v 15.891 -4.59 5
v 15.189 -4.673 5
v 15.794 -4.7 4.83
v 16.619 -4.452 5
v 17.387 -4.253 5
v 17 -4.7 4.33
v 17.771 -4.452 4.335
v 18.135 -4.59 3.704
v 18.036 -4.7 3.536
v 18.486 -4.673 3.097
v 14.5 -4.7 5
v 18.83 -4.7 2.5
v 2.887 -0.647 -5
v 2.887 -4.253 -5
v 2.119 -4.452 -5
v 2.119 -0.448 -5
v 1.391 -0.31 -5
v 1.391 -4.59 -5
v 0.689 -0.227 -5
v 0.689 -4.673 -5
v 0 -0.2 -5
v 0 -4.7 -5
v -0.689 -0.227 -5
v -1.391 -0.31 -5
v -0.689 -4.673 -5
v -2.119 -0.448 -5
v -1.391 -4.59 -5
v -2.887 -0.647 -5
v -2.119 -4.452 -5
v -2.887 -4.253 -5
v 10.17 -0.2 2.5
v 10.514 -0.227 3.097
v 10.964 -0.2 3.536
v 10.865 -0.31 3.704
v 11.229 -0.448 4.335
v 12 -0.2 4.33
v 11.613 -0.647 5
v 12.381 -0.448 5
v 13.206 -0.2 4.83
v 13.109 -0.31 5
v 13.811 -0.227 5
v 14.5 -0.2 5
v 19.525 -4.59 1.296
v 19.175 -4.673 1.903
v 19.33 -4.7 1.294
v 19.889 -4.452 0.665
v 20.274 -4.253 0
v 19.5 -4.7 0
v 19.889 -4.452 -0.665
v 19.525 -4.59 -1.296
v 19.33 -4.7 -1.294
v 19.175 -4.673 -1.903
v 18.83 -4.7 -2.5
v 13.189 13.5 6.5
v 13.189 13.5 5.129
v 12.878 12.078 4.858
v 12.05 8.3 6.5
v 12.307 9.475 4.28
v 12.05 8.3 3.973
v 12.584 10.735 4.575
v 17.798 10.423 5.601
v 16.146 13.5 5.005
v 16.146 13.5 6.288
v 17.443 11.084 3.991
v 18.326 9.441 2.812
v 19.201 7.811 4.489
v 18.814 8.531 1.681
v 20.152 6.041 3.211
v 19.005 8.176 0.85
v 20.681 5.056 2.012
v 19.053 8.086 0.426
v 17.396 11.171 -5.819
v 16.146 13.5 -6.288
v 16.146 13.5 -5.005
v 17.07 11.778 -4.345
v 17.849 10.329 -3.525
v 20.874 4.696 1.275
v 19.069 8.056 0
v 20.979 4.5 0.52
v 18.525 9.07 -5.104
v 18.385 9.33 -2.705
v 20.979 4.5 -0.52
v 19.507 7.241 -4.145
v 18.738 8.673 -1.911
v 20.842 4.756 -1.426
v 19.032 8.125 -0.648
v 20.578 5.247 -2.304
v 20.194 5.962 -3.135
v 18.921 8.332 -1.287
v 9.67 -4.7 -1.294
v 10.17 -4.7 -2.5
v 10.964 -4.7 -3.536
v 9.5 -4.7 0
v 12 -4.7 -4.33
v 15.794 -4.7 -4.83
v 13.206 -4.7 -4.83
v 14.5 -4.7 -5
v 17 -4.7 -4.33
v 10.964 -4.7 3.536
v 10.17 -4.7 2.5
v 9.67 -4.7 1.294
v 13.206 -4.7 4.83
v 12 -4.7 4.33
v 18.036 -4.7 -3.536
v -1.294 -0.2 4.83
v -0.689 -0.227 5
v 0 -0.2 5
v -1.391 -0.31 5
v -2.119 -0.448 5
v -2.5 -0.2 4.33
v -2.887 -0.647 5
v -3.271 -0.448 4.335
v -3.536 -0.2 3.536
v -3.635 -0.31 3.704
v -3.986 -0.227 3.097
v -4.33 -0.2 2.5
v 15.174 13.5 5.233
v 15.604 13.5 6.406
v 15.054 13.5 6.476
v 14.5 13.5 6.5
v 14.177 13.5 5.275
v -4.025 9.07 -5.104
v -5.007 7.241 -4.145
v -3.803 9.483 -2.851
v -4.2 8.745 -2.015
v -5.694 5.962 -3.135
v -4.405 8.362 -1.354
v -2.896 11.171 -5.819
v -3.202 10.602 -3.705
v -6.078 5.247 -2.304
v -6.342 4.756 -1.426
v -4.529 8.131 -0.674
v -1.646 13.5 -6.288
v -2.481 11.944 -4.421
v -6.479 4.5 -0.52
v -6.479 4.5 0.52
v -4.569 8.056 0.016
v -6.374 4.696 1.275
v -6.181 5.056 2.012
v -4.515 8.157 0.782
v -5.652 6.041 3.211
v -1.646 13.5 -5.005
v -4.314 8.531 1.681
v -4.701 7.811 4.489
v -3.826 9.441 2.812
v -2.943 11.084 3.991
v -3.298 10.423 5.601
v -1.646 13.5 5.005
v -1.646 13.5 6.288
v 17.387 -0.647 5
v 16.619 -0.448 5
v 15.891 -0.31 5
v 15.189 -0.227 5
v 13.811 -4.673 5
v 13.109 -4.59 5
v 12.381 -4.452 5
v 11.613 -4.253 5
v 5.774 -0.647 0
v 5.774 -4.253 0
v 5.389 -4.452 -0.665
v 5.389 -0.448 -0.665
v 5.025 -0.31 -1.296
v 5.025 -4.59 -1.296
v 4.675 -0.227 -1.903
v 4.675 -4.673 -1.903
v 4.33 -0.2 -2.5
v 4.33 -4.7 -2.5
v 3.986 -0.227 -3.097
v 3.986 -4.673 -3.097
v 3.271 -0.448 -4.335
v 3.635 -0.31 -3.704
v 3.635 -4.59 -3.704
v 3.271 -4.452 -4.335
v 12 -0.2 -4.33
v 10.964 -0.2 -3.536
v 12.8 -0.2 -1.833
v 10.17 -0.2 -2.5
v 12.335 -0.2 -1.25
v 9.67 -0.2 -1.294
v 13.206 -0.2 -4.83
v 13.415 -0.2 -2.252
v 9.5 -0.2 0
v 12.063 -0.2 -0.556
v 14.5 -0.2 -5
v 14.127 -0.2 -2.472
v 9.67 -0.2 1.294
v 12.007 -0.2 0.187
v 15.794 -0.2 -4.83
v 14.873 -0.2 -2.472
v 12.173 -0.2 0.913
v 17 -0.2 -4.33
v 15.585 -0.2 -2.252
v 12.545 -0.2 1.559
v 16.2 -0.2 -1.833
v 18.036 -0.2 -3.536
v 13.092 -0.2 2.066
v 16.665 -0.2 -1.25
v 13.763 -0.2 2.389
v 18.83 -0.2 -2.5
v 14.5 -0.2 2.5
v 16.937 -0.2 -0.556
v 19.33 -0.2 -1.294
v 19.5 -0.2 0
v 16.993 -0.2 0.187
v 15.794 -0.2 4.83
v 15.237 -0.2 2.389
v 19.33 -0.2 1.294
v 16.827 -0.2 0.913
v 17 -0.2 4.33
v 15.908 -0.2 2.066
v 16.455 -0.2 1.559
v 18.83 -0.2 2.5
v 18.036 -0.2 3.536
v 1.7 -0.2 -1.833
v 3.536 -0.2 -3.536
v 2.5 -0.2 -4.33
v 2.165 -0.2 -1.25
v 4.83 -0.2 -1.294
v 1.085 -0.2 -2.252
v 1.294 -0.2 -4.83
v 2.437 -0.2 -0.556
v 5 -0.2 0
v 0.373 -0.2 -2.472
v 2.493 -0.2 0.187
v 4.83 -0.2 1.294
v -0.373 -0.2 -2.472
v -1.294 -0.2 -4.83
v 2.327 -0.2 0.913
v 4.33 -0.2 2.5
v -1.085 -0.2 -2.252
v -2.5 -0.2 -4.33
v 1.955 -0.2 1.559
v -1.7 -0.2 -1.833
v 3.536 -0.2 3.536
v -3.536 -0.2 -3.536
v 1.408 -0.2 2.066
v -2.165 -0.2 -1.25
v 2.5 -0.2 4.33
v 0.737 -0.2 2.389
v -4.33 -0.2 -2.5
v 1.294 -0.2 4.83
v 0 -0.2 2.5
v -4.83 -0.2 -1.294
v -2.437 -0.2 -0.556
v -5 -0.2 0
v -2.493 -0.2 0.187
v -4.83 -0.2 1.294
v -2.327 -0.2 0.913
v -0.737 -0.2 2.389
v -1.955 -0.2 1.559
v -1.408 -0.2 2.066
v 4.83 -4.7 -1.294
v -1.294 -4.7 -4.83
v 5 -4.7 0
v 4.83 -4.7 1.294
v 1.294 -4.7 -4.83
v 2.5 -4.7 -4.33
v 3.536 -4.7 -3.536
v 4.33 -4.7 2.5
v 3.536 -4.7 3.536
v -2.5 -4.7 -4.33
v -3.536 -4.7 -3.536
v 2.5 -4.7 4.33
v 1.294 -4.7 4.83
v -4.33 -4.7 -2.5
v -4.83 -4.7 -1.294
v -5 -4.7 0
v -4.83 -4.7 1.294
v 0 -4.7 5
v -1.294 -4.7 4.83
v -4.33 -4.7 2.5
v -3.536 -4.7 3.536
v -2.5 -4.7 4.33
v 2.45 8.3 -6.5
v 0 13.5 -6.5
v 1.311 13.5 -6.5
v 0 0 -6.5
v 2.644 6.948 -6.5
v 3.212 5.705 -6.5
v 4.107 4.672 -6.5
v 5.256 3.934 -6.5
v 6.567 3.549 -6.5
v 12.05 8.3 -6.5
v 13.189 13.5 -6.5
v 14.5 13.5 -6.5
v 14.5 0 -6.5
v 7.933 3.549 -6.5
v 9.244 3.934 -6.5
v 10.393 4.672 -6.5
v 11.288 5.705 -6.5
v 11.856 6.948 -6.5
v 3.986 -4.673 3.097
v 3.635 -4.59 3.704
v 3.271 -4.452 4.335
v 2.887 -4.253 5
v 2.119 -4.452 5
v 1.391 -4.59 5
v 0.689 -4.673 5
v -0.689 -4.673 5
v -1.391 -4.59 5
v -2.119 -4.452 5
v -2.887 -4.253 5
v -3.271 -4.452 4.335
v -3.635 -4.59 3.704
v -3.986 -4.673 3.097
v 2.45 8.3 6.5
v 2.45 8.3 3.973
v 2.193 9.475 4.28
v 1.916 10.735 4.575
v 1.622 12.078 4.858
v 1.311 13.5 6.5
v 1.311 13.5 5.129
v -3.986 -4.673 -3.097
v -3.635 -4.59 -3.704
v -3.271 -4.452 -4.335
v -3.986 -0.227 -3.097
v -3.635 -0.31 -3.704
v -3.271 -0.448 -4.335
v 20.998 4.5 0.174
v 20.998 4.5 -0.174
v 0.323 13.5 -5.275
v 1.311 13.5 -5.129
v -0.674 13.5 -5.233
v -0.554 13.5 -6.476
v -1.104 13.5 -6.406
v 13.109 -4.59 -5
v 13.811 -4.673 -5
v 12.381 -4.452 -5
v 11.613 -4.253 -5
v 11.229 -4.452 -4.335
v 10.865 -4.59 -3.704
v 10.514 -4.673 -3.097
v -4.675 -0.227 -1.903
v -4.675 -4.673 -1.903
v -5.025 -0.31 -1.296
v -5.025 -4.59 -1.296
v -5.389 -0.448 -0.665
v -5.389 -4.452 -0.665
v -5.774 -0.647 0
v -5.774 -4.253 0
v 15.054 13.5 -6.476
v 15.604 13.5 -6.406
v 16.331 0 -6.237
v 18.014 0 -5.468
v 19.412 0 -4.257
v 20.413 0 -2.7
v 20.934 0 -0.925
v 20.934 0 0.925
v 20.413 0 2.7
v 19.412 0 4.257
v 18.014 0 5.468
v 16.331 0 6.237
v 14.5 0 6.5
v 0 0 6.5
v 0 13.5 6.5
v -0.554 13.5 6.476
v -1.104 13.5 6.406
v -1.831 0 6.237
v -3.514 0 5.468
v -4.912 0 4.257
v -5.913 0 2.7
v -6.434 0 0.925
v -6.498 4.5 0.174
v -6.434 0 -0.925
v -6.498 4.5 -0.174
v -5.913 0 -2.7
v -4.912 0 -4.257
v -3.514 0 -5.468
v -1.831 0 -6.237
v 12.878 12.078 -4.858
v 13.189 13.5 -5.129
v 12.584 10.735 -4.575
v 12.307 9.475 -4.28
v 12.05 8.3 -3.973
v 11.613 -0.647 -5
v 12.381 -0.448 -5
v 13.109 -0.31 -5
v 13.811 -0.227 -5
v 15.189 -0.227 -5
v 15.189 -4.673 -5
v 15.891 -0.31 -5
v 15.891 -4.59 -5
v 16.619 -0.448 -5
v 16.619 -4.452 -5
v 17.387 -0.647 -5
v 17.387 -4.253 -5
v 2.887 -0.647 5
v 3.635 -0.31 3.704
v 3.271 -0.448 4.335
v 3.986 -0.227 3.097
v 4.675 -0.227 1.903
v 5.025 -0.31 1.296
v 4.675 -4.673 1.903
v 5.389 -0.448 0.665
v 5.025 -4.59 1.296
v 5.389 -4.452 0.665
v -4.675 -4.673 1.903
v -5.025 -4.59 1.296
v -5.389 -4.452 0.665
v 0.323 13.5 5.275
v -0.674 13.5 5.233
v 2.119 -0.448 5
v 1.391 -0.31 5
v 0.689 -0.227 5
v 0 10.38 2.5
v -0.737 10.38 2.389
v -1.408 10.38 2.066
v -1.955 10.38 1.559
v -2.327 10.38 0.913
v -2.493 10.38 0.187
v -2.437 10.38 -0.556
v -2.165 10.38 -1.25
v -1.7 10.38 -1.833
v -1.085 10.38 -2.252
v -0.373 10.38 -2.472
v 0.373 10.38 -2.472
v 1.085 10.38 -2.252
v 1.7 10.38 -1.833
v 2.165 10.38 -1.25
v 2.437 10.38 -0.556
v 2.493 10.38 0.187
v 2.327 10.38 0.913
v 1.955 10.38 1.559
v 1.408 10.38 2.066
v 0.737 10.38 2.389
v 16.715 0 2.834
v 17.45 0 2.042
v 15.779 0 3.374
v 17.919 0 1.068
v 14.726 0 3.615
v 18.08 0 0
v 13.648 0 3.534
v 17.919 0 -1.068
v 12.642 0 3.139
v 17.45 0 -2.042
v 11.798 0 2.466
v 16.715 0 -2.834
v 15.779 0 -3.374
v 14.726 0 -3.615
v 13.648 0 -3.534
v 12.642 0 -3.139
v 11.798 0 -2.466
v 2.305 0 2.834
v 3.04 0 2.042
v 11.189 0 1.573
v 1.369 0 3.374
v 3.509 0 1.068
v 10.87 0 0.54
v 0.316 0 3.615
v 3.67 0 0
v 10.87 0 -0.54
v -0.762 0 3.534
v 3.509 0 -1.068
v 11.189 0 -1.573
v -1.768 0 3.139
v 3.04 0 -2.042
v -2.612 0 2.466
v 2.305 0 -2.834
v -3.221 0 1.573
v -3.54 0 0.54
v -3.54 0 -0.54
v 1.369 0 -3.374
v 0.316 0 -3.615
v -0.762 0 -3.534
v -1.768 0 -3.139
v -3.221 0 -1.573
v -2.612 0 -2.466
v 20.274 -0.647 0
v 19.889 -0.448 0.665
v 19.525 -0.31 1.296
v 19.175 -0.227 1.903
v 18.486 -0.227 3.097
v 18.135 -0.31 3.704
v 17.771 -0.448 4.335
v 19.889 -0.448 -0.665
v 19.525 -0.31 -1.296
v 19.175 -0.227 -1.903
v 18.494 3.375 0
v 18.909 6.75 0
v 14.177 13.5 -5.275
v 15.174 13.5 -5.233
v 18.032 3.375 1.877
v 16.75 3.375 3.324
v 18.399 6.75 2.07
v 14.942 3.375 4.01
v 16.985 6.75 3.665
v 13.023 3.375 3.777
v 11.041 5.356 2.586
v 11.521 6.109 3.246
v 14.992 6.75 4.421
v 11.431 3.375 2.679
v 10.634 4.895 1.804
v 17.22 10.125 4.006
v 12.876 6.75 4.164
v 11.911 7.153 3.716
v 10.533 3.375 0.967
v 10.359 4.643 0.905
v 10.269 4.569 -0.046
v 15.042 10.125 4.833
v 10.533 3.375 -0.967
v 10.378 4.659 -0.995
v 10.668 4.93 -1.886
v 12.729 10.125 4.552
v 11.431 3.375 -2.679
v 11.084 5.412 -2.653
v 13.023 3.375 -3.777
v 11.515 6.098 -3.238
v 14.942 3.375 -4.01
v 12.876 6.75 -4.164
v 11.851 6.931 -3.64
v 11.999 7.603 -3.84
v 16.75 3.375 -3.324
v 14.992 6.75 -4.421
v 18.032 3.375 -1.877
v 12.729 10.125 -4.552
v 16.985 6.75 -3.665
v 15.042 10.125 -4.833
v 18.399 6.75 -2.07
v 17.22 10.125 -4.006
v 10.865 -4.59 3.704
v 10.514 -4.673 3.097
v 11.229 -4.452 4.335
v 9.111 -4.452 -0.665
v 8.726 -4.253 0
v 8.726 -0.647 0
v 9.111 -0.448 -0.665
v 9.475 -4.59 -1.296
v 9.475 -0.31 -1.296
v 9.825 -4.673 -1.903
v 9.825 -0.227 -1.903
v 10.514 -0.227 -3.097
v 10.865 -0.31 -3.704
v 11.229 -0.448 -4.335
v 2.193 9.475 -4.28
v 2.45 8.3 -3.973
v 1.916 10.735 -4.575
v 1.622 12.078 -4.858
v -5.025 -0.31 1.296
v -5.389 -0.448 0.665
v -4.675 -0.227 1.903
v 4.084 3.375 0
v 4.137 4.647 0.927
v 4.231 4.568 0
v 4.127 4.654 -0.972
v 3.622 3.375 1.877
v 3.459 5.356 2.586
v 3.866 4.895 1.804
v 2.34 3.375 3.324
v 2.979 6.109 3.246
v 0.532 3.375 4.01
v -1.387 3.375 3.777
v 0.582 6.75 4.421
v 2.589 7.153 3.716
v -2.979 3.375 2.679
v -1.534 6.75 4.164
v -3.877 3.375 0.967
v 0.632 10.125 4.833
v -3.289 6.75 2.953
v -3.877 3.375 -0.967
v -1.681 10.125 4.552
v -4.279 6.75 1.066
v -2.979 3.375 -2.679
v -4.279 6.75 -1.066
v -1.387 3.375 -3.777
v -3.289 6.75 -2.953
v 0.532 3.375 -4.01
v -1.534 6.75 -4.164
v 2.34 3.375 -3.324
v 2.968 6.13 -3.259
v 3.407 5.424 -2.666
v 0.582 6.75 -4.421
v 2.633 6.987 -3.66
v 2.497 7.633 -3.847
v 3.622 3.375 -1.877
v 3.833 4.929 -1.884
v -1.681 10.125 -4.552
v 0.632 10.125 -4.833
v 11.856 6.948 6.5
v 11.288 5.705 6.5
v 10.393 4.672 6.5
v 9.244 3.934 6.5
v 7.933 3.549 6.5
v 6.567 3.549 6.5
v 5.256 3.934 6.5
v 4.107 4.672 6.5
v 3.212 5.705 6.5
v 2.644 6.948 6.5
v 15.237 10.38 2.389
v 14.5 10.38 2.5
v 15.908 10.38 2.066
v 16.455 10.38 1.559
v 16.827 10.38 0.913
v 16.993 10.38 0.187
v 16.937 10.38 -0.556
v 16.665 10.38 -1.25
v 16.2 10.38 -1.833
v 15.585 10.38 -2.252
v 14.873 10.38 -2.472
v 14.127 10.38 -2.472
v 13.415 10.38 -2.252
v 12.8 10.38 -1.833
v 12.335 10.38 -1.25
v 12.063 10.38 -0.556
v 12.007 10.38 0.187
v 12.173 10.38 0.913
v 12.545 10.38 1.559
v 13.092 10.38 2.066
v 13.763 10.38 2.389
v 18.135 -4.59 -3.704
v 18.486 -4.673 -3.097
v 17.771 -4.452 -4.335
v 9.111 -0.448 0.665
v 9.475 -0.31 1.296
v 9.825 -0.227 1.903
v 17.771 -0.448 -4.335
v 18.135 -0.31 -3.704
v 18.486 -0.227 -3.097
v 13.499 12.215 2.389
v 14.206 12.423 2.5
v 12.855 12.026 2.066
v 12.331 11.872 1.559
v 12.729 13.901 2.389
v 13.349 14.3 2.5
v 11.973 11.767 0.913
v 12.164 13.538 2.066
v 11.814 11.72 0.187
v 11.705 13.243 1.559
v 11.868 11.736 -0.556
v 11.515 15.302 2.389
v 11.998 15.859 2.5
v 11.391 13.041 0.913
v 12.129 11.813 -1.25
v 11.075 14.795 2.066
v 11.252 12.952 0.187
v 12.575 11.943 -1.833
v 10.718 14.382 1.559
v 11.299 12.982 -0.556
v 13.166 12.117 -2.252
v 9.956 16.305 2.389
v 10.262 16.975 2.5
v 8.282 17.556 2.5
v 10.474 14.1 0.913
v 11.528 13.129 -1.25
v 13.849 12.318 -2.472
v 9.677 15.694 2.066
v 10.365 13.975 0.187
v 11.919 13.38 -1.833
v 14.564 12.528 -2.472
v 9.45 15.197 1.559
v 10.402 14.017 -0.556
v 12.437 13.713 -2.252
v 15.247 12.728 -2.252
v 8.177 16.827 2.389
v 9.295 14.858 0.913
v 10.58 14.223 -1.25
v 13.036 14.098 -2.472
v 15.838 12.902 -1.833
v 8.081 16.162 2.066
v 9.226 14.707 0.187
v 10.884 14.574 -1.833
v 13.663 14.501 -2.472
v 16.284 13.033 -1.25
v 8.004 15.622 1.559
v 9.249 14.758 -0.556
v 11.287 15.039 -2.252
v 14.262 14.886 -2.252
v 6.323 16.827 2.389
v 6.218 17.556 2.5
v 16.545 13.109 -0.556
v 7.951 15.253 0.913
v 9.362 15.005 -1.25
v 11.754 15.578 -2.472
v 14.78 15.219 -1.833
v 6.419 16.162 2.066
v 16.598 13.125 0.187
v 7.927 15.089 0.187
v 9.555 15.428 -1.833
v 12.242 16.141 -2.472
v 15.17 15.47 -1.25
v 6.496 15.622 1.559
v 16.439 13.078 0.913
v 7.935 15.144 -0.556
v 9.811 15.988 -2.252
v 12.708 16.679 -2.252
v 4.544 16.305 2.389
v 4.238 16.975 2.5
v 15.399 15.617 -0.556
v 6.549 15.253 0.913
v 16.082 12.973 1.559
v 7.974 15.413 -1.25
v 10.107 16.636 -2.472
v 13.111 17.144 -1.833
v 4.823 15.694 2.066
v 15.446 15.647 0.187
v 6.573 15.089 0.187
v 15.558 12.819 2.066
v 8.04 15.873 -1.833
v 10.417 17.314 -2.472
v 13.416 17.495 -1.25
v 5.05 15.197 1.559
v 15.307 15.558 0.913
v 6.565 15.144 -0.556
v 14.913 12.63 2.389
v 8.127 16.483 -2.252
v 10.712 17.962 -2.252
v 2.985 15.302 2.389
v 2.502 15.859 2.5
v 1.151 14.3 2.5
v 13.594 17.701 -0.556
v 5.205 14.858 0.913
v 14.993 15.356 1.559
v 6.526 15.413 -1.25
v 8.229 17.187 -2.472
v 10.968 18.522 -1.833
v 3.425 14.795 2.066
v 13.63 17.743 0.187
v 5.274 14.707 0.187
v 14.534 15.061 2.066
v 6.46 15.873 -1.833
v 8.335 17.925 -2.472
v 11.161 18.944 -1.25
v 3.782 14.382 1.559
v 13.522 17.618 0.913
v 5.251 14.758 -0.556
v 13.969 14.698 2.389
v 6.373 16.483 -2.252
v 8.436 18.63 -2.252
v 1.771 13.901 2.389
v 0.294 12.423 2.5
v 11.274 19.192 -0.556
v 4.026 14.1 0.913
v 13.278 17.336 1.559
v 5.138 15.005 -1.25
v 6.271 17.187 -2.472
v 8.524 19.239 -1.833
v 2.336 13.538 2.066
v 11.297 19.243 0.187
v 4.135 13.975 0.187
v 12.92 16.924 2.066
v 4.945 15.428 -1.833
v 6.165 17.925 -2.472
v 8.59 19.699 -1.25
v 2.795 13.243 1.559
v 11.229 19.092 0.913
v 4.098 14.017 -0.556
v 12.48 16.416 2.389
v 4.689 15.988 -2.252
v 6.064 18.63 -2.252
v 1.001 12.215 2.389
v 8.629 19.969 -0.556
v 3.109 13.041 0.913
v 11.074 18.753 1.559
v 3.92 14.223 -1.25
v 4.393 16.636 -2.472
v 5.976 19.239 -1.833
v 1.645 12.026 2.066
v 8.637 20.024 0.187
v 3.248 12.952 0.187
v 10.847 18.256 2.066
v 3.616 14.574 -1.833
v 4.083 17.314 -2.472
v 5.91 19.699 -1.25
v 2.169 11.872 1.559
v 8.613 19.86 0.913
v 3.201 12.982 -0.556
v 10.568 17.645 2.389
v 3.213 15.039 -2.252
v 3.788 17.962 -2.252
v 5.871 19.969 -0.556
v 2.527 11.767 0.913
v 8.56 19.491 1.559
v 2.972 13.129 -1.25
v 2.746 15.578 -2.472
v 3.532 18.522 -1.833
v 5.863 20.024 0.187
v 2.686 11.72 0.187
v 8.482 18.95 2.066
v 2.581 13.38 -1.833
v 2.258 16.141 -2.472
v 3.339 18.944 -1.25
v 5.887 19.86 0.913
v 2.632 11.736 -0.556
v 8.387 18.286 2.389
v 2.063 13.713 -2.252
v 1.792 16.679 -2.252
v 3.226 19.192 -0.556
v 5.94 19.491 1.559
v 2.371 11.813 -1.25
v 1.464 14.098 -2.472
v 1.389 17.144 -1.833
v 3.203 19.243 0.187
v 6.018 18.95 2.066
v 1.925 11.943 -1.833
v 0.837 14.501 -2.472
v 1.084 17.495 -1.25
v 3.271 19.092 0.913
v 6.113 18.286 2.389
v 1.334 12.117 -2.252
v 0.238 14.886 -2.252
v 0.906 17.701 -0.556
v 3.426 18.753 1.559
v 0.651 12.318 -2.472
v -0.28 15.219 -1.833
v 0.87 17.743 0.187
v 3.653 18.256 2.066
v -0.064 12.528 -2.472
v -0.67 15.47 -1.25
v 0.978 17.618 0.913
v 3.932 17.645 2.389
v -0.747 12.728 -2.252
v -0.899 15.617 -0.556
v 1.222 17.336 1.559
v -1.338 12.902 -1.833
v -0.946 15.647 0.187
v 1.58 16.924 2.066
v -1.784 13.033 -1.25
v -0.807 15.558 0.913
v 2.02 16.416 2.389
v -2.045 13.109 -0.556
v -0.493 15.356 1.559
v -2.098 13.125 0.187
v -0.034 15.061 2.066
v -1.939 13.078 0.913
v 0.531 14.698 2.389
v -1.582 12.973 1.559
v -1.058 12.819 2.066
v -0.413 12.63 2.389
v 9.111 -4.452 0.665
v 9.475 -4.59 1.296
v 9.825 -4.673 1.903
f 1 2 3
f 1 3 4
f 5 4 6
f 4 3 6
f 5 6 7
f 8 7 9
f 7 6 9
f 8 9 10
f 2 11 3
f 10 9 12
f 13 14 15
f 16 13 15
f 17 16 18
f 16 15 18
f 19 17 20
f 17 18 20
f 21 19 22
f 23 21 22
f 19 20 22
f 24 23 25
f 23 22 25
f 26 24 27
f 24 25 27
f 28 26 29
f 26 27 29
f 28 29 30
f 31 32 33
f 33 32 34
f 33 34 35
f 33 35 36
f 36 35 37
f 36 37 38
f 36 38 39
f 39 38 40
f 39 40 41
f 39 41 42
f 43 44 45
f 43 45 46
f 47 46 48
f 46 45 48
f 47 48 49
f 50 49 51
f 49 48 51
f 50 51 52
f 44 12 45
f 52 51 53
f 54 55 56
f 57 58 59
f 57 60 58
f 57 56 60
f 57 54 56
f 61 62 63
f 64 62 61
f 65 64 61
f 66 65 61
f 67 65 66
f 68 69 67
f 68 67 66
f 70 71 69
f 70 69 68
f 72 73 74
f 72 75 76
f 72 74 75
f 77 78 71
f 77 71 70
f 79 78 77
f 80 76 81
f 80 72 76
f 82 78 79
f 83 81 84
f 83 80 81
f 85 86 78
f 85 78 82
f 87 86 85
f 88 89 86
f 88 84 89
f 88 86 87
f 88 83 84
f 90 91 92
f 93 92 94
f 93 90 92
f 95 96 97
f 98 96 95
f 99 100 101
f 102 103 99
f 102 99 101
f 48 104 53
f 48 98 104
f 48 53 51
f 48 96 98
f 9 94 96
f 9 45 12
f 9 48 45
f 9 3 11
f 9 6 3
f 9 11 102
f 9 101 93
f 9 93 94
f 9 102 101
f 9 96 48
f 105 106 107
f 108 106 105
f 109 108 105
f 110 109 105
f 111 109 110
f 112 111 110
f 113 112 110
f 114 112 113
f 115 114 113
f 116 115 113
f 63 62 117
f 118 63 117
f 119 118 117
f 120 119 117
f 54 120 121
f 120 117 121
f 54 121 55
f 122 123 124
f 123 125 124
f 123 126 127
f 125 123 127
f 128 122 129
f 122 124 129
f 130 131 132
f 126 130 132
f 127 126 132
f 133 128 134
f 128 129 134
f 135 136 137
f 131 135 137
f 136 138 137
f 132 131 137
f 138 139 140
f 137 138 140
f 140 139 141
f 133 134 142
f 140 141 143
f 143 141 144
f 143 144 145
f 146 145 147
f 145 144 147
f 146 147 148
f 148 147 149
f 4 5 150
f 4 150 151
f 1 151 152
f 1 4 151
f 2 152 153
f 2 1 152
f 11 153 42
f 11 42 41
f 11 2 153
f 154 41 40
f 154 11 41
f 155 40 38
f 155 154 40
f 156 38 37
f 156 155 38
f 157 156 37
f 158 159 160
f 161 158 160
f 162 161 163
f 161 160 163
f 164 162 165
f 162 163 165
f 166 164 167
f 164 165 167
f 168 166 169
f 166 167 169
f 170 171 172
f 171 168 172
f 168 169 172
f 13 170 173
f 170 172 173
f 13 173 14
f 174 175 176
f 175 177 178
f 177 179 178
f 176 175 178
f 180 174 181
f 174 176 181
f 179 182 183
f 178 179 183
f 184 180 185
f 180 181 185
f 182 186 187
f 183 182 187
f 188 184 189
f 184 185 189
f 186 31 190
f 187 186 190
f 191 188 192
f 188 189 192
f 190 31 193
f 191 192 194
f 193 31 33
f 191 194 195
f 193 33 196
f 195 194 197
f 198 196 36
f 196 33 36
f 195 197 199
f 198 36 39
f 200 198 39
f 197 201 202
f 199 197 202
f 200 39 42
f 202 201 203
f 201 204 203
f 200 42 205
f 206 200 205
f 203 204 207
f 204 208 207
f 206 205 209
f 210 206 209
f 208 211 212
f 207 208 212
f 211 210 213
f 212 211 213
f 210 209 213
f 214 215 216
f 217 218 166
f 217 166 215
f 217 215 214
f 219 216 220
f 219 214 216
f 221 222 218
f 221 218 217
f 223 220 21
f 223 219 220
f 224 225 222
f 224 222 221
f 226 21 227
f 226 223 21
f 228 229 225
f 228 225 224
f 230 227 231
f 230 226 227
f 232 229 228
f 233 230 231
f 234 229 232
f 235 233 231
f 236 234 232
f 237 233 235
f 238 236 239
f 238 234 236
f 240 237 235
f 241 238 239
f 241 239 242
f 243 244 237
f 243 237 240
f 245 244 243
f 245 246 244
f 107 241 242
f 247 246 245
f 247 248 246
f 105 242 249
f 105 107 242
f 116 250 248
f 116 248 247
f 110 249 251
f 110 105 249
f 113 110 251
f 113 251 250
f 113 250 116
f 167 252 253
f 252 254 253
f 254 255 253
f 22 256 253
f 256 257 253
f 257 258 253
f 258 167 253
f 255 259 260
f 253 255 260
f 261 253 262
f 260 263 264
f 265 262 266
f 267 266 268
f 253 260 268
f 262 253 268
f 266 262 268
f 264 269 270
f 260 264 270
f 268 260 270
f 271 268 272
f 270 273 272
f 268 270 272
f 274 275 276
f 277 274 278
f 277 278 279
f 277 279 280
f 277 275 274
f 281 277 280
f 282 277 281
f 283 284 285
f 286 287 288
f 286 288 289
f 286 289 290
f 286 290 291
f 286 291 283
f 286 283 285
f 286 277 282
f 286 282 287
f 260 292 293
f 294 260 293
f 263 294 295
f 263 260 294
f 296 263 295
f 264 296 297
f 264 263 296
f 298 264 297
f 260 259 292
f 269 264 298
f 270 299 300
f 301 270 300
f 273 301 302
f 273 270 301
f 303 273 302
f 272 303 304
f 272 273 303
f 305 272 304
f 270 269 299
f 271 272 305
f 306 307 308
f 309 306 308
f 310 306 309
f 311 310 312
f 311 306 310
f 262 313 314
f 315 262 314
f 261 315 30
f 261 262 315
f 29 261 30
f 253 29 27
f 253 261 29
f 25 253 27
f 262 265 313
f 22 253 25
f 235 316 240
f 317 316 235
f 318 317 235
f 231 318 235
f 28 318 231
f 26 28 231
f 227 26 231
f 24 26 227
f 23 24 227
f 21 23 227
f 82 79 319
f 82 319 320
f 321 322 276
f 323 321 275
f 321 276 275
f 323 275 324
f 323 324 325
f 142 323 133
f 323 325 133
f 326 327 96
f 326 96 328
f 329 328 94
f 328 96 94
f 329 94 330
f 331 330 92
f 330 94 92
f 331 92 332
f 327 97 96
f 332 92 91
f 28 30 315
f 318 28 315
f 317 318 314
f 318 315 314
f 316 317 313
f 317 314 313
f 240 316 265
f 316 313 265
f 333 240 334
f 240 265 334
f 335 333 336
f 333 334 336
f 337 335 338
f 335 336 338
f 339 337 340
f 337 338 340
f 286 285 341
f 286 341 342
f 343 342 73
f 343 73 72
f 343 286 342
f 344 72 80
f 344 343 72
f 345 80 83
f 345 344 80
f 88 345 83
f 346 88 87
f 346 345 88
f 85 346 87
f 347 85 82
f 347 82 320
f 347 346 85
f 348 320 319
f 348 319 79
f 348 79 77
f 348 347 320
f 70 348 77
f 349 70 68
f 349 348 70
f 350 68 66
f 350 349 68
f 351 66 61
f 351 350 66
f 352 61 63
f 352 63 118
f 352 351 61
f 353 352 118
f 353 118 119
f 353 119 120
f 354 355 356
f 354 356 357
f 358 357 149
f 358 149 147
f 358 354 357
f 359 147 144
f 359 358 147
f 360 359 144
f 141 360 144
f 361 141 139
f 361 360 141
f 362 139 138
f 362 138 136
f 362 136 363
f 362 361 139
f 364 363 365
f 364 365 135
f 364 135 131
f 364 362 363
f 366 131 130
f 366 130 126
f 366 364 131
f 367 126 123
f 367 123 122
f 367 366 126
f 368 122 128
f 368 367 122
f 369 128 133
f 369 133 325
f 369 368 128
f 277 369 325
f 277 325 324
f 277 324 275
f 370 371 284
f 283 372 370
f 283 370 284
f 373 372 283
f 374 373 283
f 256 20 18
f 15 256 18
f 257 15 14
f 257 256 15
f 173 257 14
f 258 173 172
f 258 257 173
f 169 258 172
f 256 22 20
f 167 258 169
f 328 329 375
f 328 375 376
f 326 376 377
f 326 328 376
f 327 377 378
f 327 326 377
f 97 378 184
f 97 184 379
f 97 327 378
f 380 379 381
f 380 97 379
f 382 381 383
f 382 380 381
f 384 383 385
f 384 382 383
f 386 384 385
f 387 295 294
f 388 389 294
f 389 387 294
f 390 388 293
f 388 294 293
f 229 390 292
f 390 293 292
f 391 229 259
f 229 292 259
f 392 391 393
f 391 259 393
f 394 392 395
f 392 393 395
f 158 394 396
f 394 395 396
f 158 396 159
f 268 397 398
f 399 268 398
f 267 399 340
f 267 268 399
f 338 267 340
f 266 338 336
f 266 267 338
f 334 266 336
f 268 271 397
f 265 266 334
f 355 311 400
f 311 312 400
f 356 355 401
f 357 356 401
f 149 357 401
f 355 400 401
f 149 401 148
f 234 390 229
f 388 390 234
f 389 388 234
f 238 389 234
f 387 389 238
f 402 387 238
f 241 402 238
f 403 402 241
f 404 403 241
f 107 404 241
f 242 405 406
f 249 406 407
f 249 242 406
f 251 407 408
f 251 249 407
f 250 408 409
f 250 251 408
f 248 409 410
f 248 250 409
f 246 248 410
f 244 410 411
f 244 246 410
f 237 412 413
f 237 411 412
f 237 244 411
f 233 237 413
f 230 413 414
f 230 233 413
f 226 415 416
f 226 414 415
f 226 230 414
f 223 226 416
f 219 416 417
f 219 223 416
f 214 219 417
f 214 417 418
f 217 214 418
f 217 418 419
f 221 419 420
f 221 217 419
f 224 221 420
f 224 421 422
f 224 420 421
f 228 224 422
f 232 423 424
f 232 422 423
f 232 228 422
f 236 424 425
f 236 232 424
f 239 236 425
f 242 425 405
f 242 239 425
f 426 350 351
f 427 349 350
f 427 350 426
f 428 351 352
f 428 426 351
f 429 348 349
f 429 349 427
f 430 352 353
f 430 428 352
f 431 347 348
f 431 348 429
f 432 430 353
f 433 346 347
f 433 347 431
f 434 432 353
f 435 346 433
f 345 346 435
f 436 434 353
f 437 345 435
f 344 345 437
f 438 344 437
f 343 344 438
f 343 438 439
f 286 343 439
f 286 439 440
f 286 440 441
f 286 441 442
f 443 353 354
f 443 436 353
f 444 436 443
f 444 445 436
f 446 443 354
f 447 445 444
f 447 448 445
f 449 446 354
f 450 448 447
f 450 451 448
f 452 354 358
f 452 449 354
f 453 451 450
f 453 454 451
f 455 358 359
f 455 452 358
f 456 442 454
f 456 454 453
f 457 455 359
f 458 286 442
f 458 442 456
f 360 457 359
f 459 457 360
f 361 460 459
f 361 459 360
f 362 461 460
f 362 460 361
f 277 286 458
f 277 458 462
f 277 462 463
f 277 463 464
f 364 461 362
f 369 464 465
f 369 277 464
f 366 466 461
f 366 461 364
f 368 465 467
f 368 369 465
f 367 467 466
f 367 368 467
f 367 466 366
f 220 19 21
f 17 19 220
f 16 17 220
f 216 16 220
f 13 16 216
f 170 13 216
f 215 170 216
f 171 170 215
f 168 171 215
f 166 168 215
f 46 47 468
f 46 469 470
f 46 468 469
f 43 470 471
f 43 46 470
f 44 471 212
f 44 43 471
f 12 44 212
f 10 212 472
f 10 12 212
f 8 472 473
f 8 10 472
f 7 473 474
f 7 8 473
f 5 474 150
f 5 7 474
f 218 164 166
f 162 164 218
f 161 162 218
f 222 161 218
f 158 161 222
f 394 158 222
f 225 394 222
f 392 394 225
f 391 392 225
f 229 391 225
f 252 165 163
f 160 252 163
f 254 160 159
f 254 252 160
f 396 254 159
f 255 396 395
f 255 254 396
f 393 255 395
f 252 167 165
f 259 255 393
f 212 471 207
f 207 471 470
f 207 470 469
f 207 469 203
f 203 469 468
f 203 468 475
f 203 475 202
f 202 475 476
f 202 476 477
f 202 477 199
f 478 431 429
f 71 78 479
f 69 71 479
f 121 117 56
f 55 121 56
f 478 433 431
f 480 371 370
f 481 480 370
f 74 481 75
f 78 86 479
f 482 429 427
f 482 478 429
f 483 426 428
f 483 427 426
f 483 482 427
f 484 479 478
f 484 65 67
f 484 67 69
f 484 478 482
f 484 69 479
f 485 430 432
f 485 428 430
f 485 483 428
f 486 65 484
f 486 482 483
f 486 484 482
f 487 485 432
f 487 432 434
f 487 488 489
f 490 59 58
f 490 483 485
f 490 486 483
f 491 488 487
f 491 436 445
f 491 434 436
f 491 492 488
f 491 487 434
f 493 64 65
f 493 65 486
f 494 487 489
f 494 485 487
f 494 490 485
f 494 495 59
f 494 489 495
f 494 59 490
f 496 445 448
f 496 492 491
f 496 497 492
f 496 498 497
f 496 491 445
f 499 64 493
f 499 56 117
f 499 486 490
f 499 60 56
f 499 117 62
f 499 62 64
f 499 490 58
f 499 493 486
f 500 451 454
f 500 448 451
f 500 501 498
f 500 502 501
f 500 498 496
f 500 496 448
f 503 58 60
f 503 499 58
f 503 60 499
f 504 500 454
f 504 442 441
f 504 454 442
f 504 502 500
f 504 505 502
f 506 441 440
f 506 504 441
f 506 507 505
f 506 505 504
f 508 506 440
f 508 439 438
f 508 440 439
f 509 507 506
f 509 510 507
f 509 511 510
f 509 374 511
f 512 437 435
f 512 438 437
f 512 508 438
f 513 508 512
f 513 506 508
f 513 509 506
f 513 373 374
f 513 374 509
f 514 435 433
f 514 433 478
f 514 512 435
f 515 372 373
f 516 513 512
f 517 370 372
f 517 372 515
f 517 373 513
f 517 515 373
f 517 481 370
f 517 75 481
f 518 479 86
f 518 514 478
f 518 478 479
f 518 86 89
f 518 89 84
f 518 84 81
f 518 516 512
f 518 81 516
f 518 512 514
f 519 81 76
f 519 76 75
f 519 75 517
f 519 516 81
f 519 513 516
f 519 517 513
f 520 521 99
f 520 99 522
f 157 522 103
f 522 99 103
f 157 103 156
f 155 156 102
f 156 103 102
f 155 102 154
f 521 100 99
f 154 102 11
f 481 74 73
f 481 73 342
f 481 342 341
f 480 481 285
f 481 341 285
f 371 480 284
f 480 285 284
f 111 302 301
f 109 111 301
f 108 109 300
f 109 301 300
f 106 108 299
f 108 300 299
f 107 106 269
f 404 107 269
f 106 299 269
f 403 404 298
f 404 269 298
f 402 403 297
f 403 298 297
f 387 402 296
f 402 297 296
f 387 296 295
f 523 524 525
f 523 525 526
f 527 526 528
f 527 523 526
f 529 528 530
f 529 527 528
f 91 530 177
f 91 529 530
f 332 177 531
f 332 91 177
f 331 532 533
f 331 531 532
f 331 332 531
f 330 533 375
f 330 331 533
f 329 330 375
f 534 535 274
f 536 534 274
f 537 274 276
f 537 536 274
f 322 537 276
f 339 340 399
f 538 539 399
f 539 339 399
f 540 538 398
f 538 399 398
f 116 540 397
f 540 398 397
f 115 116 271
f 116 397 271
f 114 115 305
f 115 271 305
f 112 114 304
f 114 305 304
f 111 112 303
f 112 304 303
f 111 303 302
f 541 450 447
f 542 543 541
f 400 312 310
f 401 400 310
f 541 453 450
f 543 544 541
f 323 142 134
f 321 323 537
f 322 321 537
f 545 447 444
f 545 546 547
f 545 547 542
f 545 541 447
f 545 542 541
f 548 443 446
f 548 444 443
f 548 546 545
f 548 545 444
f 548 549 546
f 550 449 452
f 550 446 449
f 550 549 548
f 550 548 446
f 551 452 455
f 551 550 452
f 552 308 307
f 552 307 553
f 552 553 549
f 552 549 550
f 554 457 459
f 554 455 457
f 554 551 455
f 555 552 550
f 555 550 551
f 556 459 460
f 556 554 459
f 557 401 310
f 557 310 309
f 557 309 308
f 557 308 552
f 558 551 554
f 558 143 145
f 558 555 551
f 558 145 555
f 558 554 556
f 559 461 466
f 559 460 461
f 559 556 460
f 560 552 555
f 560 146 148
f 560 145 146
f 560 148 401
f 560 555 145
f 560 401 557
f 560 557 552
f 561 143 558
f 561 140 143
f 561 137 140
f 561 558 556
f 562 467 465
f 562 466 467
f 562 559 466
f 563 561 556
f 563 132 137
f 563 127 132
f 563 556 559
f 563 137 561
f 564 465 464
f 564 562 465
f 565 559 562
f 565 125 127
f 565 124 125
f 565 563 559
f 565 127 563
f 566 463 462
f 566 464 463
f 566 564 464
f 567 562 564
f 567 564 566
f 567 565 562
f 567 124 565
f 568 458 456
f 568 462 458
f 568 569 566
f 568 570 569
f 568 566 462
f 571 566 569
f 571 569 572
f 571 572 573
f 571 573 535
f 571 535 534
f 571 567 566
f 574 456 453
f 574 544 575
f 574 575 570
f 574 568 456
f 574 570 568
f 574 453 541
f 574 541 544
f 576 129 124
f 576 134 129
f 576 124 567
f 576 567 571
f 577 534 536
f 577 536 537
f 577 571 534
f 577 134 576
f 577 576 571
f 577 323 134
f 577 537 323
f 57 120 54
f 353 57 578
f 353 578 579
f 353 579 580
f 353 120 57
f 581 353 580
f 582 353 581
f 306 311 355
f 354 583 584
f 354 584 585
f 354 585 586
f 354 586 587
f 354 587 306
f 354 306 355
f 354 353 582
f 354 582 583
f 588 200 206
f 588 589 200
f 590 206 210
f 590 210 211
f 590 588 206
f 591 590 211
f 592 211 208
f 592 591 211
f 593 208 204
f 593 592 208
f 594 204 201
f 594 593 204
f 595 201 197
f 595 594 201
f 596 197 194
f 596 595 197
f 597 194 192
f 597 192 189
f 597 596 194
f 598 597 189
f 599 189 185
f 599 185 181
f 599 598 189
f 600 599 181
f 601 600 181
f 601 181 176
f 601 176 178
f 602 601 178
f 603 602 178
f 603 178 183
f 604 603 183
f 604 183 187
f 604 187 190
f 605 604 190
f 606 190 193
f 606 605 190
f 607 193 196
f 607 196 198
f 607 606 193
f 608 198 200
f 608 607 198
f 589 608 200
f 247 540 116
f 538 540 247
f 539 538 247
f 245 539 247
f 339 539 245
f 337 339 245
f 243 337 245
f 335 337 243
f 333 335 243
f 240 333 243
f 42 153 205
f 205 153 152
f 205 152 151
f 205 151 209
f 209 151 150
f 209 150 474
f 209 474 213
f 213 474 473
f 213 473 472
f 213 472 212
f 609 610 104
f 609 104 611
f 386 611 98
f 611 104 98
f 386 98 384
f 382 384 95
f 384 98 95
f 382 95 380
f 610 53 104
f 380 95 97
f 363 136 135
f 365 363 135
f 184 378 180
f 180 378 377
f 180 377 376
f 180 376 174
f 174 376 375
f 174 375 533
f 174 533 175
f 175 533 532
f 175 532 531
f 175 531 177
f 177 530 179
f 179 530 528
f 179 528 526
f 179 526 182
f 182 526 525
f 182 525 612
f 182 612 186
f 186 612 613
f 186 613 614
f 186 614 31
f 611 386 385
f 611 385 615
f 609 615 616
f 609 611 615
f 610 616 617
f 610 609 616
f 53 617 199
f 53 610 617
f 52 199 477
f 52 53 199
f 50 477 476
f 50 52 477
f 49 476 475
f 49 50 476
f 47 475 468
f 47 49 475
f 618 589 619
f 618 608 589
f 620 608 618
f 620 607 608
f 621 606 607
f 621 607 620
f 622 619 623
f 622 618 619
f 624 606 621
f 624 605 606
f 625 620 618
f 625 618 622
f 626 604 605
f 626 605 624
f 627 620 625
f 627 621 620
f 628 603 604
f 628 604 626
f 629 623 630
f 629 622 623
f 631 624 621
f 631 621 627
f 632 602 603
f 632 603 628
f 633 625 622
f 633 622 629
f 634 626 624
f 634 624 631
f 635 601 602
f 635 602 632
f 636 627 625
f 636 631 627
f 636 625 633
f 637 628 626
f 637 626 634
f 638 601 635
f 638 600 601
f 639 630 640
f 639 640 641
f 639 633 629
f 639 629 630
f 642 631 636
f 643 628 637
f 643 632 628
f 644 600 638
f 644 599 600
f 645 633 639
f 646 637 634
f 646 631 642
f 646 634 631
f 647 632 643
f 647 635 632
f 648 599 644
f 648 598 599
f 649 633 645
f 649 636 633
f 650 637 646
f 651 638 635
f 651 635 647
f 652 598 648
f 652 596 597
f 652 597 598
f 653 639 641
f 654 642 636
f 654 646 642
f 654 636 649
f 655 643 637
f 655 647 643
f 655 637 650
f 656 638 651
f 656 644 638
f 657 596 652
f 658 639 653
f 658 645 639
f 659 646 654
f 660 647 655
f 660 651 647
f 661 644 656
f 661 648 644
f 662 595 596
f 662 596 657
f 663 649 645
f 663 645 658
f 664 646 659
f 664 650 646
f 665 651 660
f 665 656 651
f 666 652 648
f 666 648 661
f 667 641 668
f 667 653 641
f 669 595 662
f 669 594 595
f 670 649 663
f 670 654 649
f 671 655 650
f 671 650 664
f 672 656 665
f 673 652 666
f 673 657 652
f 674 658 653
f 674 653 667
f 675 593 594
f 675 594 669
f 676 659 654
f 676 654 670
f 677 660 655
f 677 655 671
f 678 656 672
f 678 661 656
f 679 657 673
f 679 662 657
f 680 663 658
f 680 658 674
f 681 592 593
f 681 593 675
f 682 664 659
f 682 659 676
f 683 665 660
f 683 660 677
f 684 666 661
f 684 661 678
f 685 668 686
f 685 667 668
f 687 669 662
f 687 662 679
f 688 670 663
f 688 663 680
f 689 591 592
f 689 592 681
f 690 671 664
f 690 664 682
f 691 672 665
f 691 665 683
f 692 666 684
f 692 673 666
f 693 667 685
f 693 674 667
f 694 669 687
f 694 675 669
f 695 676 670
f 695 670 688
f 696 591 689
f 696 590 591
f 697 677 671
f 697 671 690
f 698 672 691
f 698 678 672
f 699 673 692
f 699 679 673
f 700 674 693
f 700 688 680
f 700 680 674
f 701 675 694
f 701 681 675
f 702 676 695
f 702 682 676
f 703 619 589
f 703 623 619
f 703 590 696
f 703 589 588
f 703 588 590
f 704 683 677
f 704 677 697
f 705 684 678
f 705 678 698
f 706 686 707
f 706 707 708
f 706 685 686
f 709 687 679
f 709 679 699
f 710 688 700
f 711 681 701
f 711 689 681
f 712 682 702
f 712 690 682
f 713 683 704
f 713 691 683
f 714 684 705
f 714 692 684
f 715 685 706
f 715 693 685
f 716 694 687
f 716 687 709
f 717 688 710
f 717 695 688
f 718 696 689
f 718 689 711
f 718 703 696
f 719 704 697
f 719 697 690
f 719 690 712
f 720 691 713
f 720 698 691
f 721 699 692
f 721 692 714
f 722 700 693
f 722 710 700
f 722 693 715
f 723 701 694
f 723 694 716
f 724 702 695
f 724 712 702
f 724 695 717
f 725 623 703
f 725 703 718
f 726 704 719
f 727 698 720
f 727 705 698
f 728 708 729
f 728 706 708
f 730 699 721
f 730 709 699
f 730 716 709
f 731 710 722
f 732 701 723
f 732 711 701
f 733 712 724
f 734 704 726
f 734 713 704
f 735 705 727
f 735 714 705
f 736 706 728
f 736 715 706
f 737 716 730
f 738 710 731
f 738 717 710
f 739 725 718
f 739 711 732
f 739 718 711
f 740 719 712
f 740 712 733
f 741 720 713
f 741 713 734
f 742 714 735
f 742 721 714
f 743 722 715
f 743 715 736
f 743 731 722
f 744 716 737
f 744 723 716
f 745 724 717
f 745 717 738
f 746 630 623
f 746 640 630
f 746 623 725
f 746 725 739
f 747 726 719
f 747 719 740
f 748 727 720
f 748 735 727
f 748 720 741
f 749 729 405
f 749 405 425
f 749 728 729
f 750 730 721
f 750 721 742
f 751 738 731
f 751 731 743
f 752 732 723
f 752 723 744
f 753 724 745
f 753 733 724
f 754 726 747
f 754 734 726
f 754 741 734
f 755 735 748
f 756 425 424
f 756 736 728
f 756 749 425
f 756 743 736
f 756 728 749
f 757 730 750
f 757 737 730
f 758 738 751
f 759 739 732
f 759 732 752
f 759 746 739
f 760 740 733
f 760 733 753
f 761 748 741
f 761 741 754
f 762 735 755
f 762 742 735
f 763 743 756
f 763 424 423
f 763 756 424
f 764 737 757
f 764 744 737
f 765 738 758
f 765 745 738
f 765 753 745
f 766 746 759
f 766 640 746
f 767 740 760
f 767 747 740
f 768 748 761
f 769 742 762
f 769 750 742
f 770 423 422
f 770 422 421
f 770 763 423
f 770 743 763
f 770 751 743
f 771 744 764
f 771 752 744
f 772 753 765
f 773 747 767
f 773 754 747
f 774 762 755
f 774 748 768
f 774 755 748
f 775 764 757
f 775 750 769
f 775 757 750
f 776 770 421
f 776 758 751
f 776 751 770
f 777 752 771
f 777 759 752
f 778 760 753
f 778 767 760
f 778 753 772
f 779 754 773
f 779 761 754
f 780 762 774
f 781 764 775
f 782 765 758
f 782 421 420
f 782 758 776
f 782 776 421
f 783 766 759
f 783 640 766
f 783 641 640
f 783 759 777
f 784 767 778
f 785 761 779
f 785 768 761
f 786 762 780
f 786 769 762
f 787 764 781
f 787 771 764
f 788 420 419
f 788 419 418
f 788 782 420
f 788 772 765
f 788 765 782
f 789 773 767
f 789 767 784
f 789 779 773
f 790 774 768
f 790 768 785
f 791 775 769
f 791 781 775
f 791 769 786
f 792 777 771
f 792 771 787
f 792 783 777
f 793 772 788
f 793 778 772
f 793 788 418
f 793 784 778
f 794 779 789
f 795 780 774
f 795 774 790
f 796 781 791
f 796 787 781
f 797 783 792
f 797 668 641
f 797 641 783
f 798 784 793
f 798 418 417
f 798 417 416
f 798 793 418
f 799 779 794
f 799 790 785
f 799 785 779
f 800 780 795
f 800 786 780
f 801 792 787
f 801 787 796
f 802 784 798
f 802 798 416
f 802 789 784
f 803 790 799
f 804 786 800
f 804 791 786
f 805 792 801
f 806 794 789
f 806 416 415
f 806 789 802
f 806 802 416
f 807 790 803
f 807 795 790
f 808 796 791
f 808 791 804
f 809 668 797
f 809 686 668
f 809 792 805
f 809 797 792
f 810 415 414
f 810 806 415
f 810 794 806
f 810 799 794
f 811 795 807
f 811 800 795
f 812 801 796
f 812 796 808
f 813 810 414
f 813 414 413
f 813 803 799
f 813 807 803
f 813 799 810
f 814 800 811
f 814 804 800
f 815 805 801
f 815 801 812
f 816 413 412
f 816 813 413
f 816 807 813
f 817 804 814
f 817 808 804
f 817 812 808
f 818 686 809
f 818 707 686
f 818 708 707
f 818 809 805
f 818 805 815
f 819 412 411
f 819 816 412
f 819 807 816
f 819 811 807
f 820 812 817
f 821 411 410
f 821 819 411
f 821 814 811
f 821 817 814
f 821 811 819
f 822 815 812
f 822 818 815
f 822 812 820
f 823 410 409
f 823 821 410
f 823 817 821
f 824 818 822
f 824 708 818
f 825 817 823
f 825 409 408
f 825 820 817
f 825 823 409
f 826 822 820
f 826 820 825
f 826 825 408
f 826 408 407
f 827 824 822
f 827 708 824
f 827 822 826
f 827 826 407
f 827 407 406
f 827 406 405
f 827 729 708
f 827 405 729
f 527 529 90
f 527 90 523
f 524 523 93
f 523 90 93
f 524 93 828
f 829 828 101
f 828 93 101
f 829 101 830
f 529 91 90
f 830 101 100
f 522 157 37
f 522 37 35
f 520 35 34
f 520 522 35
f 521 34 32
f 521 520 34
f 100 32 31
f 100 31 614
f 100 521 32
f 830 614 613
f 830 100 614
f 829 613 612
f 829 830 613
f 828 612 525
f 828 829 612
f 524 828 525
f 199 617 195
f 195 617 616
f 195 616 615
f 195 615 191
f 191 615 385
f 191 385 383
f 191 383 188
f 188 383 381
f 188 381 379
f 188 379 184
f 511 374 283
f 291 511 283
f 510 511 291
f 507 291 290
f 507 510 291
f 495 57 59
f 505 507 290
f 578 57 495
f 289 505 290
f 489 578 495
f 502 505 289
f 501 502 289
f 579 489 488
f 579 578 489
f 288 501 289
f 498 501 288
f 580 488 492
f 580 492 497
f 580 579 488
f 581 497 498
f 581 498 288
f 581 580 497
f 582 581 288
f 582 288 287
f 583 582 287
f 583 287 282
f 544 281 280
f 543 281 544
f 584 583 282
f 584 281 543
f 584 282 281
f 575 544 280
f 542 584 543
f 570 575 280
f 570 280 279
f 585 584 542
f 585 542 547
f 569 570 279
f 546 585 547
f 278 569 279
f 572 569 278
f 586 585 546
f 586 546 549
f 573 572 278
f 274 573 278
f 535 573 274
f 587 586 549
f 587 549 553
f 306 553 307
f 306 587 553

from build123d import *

# Parameters (mm, degrees)
BOSS_EXTRUDE1_DEPTH = 13.5
SKETCH2_R           = 3.625
CUT_EXTRUDE1_DEPTH  = 14.5
CUT_EXTRUDE1_TAPER  = -7
CUT_EXTRUDE2_DEPTH  = 14
CUT_EXTRUDE5_DEPTH  = 17
SWEEP1_PROFILE_R    = 2.5
BOSS_EXTRUDE2_DEPTH = 4.5


with BuildPart() as part:
    # Sketch1 → Boss-Extrude1 (new body)
    with BuildSketch(Plane(origin=(0, 0, 0), x_dir=(1, 0, 0), z_dir=(0, 1, 0))):
        with BuildLine():
            Line((0, 6.5), (14.5, 6.5))
            ThreePointArc((14.5, 6.5), (21, 0), (14.5, -6.5))
            Line((14.5, -6.5), (0, -6.5))
            ThreePointArc((0, -6.5), (-6.5, 0), (0, 6.5))
        make_face()
    extrude(amount=BOSS_EXTRUDE1_DEPTH)

    # Sketch2 → Cut-Extrude1 (cut, through all)
    with BuildSketch(Plane.XZ):
        with Locations((14.455, 0)):
            Circle(SKETCH2_R)
        with Locations((0.045, 0)):
            Circle(SKETCH2_R)
    extrude(amount=-CUT_EXTRUDE1_DEPTH, taper=CUT_EXTRUDE1_TAPER, mode=Mode.SUBTRACT)

    # Sketch3 → Cut-Extrude2 (cut, through all)
    with BuildSketch(Plane.XY.offset(6.5)):
        with BuildLine():
            Line((2.45, 8.3), (1.310642586, 13.5))
            Line((1.310642586, 13.5), (13.189357414, 13.5))
            Line((13.189357414, 13.5), (12.05, 8.3))
            ThreePointArc((12.05, 8.3), (7.25, 3.5), (2.45, 8.3))
        make_face()
    extrude(amount=-CUT_EXTRUDE2_DEPTH, mode=Mode.SUBTRACT)

    # Sketch5 → Cut-Extrude5 (cut, symmetric)
    with BuildSketch(Plane.XY):
        Polygon((14.455, 16.647940665), (20.97914525, 4.5), (22.832378007, 4.5), (22.832378007, 16.647940665), (21.179941679, 16.647940665), align=None)
        Polygon((-8.332378007, 4.5), (-6.47914525, 4.5), (0.045, 16.647940665), (-6.679941679, 16.647940665), (-8.332378007, 16.647940665), align=None)
    extrude(amount=CUT_EXTRUDE5_DEPTH, both=True, mode=Mode.SUBTRACT)


with BuildPart() as body_2:
    # Sweep1: sweep along a path in Sketch6
    with BuildLine(Plane.XY) as sweep1_path:
        Line((14.5, -4.7), (14.5, 0))
        Line((14.5, 0), (14.5, 10.38))
        ThreePointArc((14.5, 10.38), (7.25, 17.63), (0, 10.38))
        Line((0, 10.38), (0, 0))
        Line((0, 0), (0, -4.7))
    # Sweep1 profile (on start of the path) → Sweep1 (sweep)
    with BuildSketch(Plane(origin=(14.5, -4.7, 0), x_dir=(0, 0, 1), z_dir=(0, 1, 0))):
        Circle(SWEEP1_PROFILE_R)
    sweep(path=sweep1_path.line)

    # Sketch35 → Boss-Extrude2 (add)
    with BuildSketch(Plane.XZ.offset(4.7)):
        Polygon((11.613248654, -5), (17.386751346, -5), (20.273502692, 0), (17.386751346, 5), (11.613248654, 5), (8.726497308, 0), align=None)
        Polygon((5.773502692, 0), (2.886751346, -5), (-2.886751346, -5), (-5.773502692, 0), (-2.886751346, 5), (2.886751346, 5), align=None)
    extrude(amount=-BOSS_EXTRUDE2_DEPTH)

    # Sketch36 → Cut-Revolve2 (revolve, cut)
    with BuildSketch(Plane(origin=(0, 0, 0), x_dir=(0, 0, -1), z_dir=(1, 0, 0))):
        Polygon((5, -0.2), (7.150676764, -1.441693809), (7.150676764, -0.2), align=None)
        Polygon((5, -4.7), (7.313939087, -4.7), (7.313939087, -3.364046645), align=None)
    cut_revolve2 = revolve(axis=Axis((0, 0, 0), (0, -1, 0)), mode=Mode.SUBTRACT)

    # Mirror1: Cut-Revolve2 across plane
    add(cut_revolve2.mirror(Plane.ZY.offset(-7.25)), mode=Mode.SUBTRACT)


solid = Compound([part.part, body_2.part])
